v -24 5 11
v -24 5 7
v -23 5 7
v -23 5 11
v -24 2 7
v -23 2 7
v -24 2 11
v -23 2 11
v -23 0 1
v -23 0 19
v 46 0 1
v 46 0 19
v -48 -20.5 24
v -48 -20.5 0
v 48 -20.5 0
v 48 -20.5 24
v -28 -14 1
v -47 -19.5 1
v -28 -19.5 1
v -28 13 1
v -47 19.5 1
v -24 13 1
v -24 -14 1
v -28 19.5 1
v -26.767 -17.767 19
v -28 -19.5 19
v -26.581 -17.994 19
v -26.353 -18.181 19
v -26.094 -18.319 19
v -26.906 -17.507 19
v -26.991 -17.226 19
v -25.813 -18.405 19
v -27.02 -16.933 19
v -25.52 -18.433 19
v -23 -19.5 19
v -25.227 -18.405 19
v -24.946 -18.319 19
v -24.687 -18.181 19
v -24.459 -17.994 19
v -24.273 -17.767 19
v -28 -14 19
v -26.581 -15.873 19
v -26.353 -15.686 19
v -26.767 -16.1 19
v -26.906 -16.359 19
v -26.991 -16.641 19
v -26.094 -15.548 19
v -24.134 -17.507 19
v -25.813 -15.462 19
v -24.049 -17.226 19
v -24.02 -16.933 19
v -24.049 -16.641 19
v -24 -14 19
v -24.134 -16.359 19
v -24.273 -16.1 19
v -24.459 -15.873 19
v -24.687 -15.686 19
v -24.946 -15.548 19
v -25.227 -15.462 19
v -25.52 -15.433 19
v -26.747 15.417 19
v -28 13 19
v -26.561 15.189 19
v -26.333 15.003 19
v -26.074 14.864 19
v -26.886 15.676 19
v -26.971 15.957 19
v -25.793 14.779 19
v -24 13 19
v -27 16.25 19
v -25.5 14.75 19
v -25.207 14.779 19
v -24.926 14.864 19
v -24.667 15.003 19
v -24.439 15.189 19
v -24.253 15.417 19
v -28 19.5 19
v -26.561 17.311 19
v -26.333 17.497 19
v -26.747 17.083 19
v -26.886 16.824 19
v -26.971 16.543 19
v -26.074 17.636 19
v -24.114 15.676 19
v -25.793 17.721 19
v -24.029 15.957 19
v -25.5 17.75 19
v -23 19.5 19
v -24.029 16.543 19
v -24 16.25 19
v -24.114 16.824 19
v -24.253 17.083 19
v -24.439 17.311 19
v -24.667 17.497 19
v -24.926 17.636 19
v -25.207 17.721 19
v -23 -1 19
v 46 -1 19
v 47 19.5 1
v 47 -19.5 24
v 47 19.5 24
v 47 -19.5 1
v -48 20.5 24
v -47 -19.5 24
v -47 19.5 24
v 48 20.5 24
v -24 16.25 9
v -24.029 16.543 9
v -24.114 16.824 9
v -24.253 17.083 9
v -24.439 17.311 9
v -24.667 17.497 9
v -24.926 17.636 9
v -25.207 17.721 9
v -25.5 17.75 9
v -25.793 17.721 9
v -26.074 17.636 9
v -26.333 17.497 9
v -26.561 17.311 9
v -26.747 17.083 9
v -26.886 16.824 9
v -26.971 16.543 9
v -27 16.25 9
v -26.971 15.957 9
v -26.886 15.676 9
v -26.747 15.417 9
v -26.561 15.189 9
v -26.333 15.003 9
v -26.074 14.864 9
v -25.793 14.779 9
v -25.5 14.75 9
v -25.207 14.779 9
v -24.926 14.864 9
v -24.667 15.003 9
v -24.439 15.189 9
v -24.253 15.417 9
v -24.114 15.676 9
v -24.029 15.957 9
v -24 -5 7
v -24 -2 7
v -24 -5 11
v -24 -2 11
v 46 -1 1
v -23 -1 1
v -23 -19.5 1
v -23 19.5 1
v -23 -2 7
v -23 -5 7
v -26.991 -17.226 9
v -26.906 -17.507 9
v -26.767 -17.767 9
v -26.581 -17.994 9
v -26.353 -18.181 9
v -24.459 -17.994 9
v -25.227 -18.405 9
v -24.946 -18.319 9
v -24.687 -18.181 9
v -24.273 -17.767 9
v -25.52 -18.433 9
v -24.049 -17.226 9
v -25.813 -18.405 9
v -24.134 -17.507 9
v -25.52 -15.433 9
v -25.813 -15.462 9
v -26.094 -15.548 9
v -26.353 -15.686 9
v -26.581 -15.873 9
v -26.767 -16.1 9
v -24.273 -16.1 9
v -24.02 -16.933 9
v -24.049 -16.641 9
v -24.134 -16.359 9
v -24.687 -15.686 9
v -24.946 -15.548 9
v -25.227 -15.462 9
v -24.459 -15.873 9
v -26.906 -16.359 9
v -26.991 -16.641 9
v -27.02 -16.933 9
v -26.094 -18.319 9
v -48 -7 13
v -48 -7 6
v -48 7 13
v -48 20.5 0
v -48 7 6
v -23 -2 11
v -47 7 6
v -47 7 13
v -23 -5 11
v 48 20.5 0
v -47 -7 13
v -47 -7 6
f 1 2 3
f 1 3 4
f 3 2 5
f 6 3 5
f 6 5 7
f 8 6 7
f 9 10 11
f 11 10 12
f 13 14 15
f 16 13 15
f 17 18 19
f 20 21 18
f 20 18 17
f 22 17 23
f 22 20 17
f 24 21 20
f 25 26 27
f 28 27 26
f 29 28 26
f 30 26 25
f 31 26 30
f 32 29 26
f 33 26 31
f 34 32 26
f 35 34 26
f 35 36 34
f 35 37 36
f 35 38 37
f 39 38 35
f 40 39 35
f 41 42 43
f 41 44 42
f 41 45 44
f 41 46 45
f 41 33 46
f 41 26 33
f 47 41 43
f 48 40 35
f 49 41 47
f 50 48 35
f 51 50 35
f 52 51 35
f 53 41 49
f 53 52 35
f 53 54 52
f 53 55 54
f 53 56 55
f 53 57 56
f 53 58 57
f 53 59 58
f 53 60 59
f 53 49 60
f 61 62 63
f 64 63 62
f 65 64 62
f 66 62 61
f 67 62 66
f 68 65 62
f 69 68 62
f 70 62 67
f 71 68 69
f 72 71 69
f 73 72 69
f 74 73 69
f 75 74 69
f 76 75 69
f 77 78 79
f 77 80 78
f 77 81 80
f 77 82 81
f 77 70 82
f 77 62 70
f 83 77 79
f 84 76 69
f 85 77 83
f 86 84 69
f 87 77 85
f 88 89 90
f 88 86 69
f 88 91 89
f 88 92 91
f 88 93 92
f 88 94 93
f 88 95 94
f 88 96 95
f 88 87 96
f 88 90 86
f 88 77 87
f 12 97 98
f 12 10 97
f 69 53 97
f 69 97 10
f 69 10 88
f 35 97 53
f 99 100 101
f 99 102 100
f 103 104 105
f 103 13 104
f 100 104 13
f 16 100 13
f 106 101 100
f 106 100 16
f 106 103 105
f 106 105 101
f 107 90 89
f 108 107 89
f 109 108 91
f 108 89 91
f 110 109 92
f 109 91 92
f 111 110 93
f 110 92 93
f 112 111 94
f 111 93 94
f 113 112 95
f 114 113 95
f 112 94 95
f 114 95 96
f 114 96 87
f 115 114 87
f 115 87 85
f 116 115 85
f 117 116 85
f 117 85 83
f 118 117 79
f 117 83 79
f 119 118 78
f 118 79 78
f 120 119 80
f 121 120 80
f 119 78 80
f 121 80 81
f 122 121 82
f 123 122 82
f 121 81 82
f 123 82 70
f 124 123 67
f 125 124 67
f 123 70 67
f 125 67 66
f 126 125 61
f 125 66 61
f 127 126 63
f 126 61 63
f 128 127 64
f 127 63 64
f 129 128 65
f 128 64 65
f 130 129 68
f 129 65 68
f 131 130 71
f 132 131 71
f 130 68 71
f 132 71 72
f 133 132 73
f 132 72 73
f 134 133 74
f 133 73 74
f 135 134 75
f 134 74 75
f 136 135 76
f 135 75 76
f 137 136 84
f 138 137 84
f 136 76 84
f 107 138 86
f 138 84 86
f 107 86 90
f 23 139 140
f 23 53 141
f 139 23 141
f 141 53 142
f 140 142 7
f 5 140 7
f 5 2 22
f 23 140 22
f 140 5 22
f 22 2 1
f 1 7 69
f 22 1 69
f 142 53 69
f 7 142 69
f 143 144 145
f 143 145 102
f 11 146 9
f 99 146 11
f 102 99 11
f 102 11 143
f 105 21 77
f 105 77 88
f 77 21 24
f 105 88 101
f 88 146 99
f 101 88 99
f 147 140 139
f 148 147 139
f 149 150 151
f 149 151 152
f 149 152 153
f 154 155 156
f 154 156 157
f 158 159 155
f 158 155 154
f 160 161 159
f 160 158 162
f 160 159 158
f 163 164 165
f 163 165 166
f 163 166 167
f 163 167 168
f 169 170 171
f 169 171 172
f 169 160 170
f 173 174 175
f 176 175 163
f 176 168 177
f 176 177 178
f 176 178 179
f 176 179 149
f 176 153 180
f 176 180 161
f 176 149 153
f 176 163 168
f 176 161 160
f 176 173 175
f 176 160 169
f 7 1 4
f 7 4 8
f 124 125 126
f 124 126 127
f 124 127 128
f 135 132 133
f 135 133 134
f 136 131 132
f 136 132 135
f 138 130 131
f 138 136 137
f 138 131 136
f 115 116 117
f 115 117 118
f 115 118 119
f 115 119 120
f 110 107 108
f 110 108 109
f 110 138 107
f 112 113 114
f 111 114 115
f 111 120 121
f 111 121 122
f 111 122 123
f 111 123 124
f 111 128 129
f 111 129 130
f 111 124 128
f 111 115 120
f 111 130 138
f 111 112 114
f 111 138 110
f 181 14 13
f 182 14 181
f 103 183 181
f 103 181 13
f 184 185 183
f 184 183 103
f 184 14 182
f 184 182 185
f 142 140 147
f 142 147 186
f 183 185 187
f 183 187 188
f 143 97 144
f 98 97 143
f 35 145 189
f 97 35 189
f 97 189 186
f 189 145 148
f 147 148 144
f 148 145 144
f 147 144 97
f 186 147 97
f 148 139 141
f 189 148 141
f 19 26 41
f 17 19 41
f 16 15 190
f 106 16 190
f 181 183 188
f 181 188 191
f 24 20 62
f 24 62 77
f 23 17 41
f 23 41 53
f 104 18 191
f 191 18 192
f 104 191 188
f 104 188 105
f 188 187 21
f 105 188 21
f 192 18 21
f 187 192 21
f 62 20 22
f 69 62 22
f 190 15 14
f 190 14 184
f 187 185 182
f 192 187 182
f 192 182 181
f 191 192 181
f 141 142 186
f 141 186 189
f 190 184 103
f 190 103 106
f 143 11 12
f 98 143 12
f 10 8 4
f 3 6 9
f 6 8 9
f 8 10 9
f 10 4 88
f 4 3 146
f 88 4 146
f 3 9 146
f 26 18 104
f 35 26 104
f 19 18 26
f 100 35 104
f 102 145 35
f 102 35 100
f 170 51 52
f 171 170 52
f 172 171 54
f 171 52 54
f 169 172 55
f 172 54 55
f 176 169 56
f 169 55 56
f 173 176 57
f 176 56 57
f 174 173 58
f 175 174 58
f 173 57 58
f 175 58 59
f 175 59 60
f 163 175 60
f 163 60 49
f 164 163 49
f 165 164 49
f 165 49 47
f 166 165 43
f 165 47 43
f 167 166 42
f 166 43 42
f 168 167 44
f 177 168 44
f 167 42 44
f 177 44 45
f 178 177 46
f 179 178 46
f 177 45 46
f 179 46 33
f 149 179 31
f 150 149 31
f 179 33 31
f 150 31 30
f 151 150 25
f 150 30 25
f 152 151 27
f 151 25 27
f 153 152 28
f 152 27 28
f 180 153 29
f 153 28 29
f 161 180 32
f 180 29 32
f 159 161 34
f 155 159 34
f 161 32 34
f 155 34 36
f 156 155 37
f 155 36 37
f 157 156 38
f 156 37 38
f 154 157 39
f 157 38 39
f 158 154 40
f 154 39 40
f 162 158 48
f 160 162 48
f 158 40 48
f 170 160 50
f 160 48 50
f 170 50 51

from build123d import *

# Parameters (mm, degrees)
F0_W      = 96
F0_H      = 41
F1_DEPTH  = 24
F2_T      = -1
F3_W      = 69
F3_H      = 19
F4_DEPTH  = 1
F6_W      = 27
F6_H      = 19
F7_DEPTH  = 1
F8_W      = 14
F8_H      = 7
F9_DEPTH  = 2
F10_W     = 3
F10_H     = 4
F11_DEPTH = 1
F12_W     = 5
F12_H     = 6.5
F12_H_2   = 5.5
F13_DEPTH = 18
F14_R     = 1.5
F15_DEPTH = 10
F16_DEPTH = 10


with BuildPart() as f1:
    # F0 (on Top) → F1 (new body)
    with BuildSketch(Plane.XY):
        Rectangle(F0_W, F0_H)
    extrude(amount=F1_DEPTH)

    # F2
    f2_openings = [f1.faces().sort_by_distance(p)[0] for p in [
        (0, 0, 24),
    ]]
    offset(amount=F2_T, openings=f2_openings)

    # F3 (on Front) → F4 (join)
    with BuildSketch(Plane.XZ):
        with Locations((11.5, 9.5)):
            Rectangle(F3_W, F3_H)
    extrude(amount=F4_DEPTH)

    # F6 (on offset) → F7 (join)
    with BuildSketch(Plane.YZ.offset(-24)):
        with Locations((-0.5, 9.5)):
            Rectangle(F6_W, F6_H)
    extrude(amount=F7_DEPTH)

    # F8 (on face) → F9 (cut)
    with BuildSketch(Plane(origin=(-48, 0, 0), x_dir=(0, -1, 0), z_dir=(-1, 0, 0))):
        with Locations((0, 9.5)):
            Rectangle(F8_W, F8_H)
    extrude(amount=-F9_DEPTH, mode=Mode.SUBTRACT)

    # F10 (on face) → F11 (cut)
    with BuildSketch(Plane(origin=(-24, 0, 0), x_dir=(0, -1, 0), z_dir=(-1, 0, 0))):
        with Locations((-3.5, 9)):
            Rectangle(F10_W, F10_H)
        with Locations((3.5, 9)):
            Rectangle(F10_W, F10_H)
    extrude(amount=-F11_DEPTH, mode=Mode.SUBTRACT)

    # F12 (on face) → F13 (join)
    with BuildSketch(Plane.XY.offset(1)):
        with Locations((-25.5, 16.25)):
            Rectangle(F12_W, F12_H)
        with Locations((-25.5, -16.75)):
            Rectangle(F12_W, F12_H_2)
    extrude(amount=F13_DEPTH)

    # F14 (on face) → F15 (cut)
    with BuildSketch(Plane.XY.offset(19)):
        with Locations((-25.5, 16.25)):
            Circle(F14_R)
    extrude(amount=-F15_DEPTH, mode=Mode.SUBTRACT)

    # F14 (on face) → F16 (cut)
    with BuildSketch(Plane.XY.offset(19)):
        with Locations((-25.5, 16.25)):
            Circle(F14_R)
        with Locations((-25.520032, -16.933361)):
            Circle(F14_R)
    extrude(amount=-F16_DEPTH, mode=Mode.SUBTRACT)


solid = f1.part
